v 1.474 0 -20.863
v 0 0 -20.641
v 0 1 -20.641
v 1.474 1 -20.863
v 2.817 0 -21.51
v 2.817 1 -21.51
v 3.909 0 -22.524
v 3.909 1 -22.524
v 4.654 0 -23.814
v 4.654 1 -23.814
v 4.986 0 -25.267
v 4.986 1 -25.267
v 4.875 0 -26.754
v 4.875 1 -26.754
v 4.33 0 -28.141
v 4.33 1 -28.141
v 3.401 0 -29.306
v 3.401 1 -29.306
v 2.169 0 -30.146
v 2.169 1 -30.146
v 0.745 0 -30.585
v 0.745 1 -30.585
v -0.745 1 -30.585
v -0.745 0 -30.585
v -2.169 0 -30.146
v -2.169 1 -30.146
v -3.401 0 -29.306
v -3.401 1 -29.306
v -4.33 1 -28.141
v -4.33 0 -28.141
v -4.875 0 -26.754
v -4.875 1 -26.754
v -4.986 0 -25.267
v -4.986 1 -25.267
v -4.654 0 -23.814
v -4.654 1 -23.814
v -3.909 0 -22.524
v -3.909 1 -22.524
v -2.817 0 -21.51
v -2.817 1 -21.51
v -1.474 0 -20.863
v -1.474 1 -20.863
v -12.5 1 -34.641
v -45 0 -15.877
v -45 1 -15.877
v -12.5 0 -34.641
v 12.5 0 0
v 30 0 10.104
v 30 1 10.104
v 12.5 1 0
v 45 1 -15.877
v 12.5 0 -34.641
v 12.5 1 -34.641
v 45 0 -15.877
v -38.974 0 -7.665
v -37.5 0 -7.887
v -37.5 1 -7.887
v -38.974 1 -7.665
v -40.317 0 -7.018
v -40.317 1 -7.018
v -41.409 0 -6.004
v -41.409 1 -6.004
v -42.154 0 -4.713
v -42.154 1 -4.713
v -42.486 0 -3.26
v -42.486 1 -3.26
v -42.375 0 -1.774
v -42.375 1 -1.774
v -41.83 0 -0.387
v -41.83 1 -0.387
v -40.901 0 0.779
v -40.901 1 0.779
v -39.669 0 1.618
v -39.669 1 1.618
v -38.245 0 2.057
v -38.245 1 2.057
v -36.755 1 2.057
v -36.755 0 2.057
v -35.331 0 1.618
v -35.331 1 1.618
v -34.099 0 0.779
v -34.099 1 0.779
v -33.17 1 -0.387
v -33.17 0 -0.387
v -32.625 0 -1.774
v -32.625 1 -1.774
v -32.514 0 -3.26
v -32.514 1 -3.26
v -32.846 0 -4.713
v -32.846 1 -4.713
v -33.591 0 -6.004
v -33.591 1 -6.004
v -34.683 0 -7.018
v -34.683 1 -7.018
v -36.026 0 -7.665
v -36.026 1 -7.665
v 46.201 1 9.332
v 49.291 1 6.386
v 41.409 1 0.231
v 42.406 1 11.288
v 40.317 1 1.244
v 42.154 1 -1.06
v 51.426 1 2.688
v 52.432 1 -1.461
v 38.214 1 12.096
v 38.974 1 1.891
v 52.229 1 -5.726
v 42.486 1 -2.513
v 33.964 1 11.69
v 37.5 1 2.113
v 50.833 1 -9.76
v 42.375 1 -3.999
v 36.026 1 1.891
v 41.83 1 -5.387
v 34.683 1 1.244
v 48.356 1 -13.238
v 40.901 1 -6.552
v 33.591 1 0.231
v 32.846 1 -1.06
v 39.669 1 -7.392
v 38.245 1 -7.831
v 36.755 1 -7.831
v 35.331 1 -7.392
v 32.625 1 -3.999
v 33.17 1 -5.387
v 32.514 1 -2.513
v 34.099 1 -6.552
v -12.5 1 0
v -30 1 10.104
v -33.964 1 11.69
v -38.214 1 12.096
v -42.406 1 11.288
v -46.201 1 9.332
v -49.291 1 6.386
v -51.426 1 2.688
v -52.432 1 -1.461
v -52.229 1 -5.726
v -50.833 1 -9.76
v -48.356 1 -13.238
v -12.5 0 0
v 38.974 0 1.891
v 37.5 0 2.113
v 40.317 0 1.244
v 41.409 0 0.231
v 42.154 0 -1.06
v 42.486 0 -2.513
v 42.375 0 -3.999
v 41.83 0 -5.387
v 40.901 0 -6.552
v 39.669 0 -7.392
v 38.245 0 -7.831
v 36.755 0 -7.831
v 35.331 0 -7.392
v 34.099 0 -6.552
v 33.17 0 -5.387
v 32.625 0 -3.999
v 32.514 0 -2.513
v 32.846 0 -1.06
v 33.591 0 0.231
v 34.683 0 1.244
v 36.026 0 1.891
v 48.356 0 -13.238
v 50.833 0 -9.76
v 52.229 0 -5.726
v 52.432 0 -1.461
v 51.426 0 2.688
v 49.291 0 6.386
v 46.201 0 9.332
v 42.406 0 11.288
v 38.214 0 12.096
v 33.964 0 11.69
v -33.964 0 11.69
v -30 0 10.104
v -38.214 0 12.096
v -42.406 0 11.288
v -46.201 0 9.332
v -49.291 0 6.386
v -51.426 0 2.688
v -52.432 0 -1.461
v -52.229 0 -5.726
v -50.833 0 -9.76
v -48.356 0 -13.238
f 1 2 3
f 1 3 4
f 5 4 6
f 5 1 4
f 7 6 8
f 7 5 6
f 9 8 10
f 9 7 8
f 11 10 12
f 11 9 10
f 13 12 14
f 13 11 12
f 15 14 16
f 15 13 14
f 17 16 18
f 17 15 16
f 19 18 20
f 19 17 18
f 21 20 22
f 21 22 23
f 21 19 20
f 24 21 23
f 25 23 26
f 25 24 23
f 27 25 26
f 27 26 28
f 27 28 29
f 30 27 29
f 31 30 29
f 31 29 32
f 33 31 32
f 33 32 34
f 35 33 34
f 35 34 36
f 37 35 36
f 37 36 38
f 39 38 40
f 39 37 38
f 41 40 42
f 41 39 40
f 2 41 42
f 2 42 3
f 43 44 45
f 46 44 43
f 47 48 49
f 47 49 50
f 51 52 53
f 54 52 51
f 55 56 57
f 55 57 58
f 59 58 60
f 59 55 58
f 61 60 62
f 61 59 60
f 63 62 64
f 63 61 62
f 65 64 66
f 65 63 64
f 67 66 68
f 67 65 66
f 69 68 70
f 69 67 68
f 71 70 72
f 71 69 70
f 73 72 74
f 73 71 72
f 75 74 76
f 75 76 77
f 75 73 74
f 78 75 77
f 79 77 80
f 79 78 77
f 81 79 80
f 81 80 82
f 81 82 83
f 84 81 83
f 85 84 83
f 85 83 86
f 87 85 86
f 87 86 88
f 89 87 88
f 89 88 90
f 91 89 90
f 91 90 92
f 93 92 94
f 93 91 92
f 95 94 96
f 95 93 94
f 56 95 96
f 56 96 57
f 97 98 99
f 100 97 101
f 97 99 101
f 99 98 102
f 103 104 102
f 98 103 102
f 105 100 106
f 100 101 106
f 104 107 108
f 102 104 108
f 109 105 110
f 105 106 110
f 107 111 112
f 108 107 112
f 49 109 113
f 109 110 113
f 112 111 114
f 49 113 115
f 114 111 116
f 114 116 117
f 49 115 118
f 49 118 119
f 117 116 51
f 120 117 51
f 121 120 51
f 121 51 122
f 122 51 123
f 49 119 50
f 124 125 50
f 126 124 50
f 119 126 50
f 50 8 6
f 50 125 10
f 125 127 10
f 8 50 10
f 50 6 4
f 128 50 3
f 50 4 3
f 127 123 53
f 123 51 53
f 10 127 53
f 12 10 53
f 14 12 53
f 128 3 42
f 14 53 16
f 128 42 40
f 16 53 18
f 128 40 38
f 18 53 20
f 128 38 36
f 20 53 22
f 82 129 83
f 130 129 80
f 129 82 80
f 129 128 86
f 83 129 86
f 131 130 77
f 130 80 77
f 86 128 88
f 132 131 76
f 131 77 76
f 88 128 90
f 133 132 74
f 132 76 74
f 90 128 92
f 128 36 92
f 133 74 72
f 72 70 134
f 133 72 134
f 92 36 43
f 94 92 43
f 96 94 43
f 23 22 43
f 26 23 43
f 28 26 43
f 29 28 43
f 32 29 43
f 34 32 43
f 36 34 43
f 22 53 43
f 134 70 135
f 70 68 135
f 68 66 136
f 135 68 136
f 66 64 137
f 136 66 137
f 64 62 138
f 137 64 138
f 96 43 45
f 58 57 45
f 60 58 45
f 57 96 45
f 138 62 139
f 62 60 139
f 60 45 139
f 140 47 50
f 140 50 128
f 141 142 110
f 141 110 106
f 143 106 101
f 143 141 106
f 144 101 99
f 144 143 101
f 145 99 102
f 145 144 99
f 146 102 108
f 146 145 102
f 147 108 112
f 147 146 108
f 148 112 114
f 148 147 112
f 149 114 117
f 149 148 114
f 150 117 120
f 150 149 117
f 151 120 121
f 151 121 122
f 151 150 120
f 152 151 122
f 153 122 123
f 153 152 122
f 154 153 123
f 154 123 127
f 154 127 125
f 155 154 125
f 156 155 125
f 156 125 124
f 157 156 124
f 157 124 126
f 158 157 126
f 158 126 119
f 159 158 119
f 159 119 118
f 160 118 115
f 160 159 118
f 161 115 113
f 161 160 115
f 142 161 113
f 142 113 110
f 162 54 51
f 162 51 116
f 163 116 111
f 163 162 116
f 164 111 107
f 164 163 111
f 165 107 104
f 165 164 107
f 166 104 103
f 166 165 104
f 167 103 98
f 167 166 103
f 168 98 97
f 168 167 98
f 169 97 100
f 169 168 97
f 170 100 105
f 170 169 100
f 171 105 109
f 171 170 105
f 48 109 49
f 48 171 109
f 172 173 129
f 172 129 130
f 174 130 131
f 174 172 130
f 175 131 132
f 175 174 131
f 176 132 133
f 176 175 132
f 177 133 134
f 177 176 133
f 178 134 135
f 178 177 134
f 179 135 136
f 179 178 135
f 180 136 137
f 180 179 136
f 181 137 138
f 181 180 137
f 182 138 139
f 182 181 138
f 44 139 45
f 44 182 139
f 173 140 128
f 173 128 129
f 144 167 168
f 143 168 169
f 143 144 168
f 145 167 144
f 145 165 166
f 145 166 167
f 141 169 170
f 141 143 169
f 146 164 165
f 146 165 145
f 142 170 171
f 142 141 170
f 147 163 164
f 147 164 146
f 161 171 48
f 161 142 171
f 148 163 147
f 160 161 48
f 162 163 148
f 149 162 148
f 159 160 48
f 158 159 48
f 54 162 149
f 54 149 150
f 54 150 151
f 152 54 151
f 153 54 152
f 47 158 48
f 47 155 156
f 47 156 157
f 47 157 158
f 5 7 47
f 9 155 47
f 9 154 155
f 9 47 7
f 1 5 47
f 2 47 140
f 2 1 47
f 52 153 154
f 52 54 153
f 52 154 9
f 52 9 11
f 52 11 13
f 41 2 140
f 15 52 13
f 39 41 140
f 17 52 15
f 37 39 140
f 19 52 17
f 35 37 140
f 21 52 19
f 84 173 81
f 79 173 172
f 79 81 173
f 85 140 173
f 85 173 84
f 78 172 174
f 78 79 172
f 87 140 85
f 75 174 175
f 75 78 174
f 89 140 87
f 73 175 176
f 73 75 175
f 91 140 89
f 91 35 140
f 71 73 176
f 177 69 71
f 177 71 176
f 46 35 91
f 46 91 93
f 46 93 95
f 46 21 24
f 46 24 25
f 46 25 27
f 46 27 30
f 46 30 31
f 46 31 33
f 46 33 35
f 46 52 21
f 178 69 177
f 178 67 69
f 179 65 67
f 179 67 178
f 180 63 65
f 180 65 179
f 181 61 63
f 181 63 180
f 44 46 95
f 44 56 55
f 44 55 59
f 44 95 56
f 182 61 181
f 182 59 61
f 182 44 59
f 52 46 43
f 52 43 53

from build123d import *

# Parameters (mm, degrees)
SZKIC1_R                    = 5
DODANIE_WYCI_GNI_CIE1_DEPTH = 1


with BuildPart() as part:
    # Szkic1 → Dodanie-wyciągnięcie1 (new body)
    with BuildSketch(Plane(origin=(0, 0, 0), x_dir=(1, 0, 0), z_dir=(0, 1, 0))):
        with BuildLine():
            Line((-12.5, 34.641016151), (12.5, 34.641016151))
            Line((12.5, 34.641016151), (45, 15.877132403))
            ThreePointArc((45, 15.877132403), (50.490381057, -4.613248654), (30, -10.103629711))
            Line((30, -10.103629711), (12.5, 0))
            Line((12.5, 0), (-12.5, 0))
            Line((-12.5, 0), (-30, -10.103629711))
            ThreePointArc((-30, -10.103629711), (-50.490381057, -4.613248654), (-45, 15.877132403))
            Line((-45, 15.877132403), (-12.5, 34.641016151))
        make_face()
        with Locations(Location((37.5, 2.886751346, 0), (0, 0, 270))):
            Circle(SZKIC1_R, mode=Mode.SUBTRACT)
        with Locations(Location((-37.5, 2.886751346, 0), (0, 0, 90))):
            Circle(SZKIC1_R, mode=Mode.SUBTRACT)
        with Locations(Location((0, 25.641016151, 0), (0, 0, 270))):
            Circle(SZKIC1_R, mode=Mode.SUBTRACT)
    extrude(amount=DODANIE_WYCI_GNI_CIE1_DEPTH)


solid = part.part
